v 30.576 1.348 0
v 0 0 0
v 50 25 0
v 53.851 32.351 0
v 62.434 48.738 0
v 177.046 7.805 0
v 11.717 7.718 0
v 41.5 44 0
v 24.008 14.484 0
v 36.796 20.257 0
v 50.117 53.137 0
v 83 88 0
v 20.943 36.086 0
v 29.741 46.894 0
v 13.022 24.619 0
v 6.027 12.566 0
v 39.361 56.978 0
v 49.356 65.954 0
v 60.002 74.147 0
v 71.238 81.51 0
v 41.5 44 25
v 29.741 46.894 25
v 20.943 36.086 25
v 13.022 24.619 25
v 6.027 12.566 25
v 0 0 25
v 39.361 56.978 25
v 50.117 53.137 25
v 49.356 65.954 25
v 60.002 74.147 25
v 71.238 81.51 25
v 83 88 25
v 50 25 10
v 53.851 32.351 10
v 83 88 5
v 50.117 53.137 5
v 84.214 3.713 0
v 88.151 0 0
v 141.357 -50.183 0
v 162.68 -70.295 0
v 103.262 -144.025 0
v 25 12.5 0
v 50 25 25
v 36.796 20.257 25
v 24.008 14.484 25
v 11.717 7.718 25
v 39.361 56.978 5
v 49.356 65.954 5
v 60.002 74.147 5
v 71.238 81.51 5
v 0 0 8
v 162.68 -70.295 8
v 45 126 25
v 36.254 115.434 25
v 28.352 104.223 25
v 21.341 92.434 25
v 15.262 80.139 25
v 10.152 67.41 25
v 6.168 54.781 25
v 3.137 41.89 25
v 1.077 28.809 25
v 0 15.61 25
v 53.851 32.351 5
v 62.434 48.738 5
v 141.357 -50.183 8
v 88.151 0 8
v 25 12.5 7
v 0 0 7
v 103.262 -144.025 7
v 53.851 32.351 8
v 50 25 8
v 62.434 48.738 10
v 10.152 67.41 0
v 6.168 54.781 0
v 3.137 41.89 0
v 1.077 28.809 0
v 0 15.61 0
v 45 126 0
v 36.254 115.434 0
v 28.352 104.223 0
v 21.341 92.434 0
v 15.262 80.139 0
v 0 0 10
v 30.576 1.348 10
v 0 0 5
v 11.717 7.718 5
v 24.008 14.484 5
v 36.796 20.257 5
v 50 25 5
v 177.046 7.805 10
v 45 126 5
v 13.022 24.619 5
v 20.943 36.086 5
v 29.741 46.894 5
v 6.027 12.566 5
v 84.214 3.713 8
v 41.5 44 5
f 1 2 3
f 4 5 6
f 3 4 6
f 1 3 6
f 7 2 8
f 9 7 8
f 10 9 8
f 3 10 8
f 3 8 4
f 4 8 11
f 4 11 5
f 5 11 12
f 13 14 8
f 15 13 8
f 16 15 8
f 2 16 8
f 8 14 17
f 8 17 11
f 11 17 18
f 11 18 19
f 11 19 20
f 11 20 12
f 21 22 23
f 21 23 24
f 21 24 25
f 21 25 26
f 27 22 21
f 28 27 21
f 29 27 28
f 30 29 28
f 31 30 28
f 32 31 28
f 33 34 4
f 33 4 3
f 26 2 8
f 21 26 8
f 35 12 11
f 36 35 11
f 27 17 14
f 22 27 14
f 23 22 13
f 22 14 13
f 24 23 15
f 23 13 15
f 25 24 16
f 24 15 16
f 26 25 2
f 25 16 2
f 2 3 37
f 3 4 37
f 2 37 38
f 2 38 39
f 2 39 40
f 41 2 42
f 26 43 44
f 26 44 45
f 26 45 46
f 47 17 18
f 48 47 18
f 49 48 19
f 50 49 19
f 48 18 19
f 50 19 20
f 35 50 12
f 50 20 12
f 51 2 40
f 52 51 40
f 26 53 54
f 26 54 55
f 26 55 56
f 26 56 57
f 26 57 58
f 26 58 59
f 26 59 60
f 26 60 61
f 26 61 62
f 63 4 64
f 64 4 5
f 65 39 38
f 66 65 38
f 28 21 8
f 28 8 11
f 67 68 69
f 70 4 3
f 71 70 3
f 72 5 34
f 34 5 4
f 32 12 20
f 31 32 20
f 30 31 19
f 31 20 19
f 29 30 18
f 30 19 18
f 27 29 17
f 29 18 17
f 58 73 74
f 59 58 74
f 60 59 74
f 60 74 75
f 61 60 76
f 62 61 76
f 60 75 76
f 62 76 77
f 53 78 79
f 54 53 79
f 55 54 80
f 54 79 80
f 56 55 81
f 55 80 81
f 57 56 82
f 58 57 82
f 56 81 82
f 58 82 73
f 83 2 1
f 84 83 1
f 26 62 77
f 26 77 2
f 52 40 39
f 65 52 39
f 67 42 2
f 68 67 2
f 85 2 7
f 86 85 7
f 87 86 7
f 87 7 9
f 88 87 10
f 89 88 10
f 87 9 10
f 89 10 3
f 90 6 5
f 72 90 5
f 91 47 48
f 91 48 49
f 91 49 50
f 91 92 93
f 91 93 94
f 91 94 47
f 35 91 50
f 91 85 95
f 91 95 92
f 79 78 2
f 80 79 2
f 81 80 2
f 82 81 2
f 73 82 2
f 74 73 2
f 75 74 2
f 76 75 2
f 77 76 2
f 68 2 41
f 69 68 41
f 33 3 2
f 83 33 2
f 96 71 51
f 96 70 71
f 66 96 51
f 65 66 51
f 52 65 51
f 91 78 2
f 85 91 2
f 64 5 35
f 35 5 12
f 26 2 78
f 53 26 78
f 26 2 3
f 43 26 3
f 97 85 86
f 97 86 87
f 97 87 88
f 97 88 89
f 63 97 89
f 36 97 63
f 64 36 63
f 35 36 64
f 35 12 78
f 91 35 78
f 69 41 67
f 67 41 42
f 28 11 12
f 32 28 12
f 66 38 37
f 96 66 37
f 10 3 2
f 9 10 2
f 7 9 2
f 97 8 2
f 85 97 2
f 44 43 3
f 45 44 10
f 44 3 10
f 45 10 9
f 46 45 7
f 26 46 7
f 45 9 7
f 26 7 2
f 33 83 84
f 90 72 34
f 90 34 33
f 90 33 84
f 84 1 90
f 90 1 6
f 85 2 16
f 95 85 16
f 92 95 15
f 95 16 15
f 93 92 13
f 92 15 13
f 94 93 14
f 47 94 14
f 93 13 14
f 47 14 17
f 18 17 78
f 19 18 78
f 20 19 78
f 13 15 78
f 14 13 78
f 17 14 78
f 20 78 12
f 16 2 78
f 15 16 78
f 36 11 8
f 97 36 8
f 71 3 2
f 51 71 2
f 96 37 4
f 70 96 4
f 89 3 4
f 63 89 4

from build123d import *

# Parameters (mm, degrees)
F1_DEPTH = 25
F2_DEPTH = 5
F3_DEPTH = 5
F4_DEPTH = 7
F5_DEPTH = 8
F6_DEPTH = 10


with BuildPart() as f1:
    # F0 (on Top) → F1 (new body)
    with BuildSketch(Plane.XY):
        with BuildLine():
            Line((10.152432519, 67.4098455289), (22.5, 63))
            Line((22.5, 63), (45, 126))
            ThreePointArc((45, 126), (24.7324515111, 98.3963039336), (10.152432519, 67.4098455289))
        make_face()
        with BuildLine():
            Line((0, 15.609906012), (0, 0))
            Line((0, 0), (22.5, 63))
            Line((22.5, 63), (10.152432519, 67.4098455289))
            ThreePointArc((10.152432519, 67.4098455289), (3.1367867799, 41.8899906336), (0, 15.609906012))
        make_face()
    extrude(amount=F1_DEPTH)


with BuildPart() as f1b:
    # F0 (on Top) → F1, piece 2 (new body)
    with BuildSketch(Plane.XY):
        with BuildLine():
            ThreePointArc((39.3605810321, 56.9783639171), (16.8700242777, 30.4305102872), (0, 0))
            Line((0, 0), (41.5, 44))
            Line((41.5, 44), (50.1174863388, 53.1366120219))
            Line((50.1174863388, 53.1366120219), (39.3605810321, 56.9783639171))
        make_face()
        with BuildLine():
            Line((50.1174863388, 53.1366120219), (83, 88))
            ThreePointArc((83, 88), (60.0019793598, 74.1467610135), (39.3605810321, 56.9783639171))
            Line((39.3605810321, 56.9783639171), (50.1174863388, 53.1366120219))
        make_face()
    extrude(amount=F1_DEPTH)


with BuildPart() as f1c:
    # F0 (on Top) → F1, piece 3 (new body)
    with BuildSketch(Plane.XY):
        with BuildLine():
            ThreePointArc((50, 25), (24.0080417918, 14.4839164165), (0, 0))
            Line((0, 0), (25, 12.5))
            Line((25, 12.5), (50, 25))
        make_face()
    extrude(amount=F1_DEPTH)


with BuildPart() as f2:
    # F0 (on Top) → F2 (new body)
    with BuildSketch(Plane.XY):
        with BuildLine():
            ThreePointArc((39.3605810321, 56.9783639171), (60.0019793598, 74.1467610135), (83, 88))
            Line((83, 88), (45, 126))
            Line((45, 126), (22.5, 63))
            Line((22.5, 63), (39.3605810321, 56.9783639171))
        make_face()
        with BuildLine():
            Line((22.5, 63), (0, 0))
            ThreePointArc((0, 0), (16.8700242777, 30.4305102872), (39.3605810321, 56.9783639171))
            Line((39.3605810321, 56.9783639171), (22.5, 63))
        make_face()
    extrude(amount=F2_DEPTH)


with BuildPart() as f3:
    # F0 (on Top) → F3 (new body)
    with BuildSketch(Plane.XY):
        Polygon((50.1174863388, 53.1366120219), (62.4340974212, 48.7378223496), (83, 88), align=None)
        Polygon((53.8505976096, 32.351140891), (62.4340974212, 48.7378223496), (50.1174863388, 53.1366120219), (41.5, 44), align=None)
        with BuildLine():
            Line((50, 25), (53.8505976096, 32.351140891))
            Line((53.8505976096, 32.351140891), (41.5, 44))
            Line((41.5, 44), (0, 0))
            ThreePointArc((0, 0), (24.0080417918, 14.4839164165), (50, 25))
        make_face()
    extrude(amount=F3_DEPTH)


with BuildPart() as f4:
    # F0 (on Top) → F4 (new body)
    with BuildSketch(Plane.XY):
        with BuildLine():
            ThreePointArc((87.4027997528, -121.9046783162), (89.1643733235, -120.6221975004), (90.9071316323, -119.3142632646))
            Line((90.9071316323, -119.3142632646), (39.8623721256, -17.2247442512))
            Line((39.8623721256, -17.2247442512), (0, 0))
            Line((0, 0), (87.4027997528, -121.9046783162))
        make_face()
        Polygon((39.8623721256, -17.2247442512), (31.25, 0), (0, 0), align=None)
        Polygon((0, 0), (31.25, 0), (30.5760385255, 1.347922949), align=None)
        Polygon((0, 0), (30.5760385255, 1.347922949), (25, 12.5), align=None)
        with BuildLine():
            Line((103.2623792125, -144.024758425), (90.9071316323, -119.3142632646))
            ThreePointArc((90.9071316323, -119.3142632646), (89.1643733235, -120.6221975004), (87.4027997528, -121.9046783162))
            Line((87.4027997528, -121.9046783162), (103.2623792125, -144.024758425))
        make_face()
    extrude(amount=F4_DEPTH)


with BuildPart() as f5:
    # F0 (on Top) → F5 (new body)
    with BuildSketch(Plane.XY):
        with BuildLine():
            ThreePointArc((137.6949577206, -59.4987278715), (139.6034874143, -54.871361399), (141.3565608313, -50.1828926023))
            Line((141.3565608314, -50.1828926023), (88.1506024096, 0))
            Line((88.1506024096, 0), (31.25, 0))
            Line((31.25, 0), (39.8623721256, -17.2247442512))
            Line((39.8623721256, -17.2247442512), (137.6949577206, -59.4987278715))
        make_face()
        with BuildLine():
            Line((162.680245713, -70.2950044793), (141.3565608314, -50.1828926023))
            ThreePointArc((141.3565608313, -50.1828926023), (139.6034874143, -54.871361399), (137.6949577206, -59.4987278715))
            Line((137.6949577206, -59.4987278715), (162.680245713, -70.2950044793))
        make_face()
        Polygon((39.8623721256, -17.2247442512), (31.25, 0), (0, 0), align=None)
        Polygon((0, 0), (30.5760385255, 1.347922949), (25, 12.5), align=None)
        Polygon((30.5760385255, 1.347922949), (84.2144228051, 3.7125330361), (53.8505976096, 32.351140891), (50, 25), (25, 12.5), align=None)
        Polygon((31.25, 0), (88.1506024096, 0), (84.2144228051, 3.7125330361), (30.5760385255, 1.347922949), align=None)
        Polygon((0, 0), (31.25, 0), (30.5760385255, 1.347922949), align=None)
    extrude(amount=F5_DEPTH)


with BuildPart() as f6:
    # F0 (on Top) → F6 (new body)
    with BuildSketch(Plane.XY):
        Polygon((0, 0), (30.5760385255, 1.347922949), (25, 12.5), align=None)
        Polygon((30.5760385255, 1.347922949), (84.2144228051, 3.7125330361), (53.8505976096, 32.351140891), (50, 25), (25, 12.5), align=None)
        with BuildLine():
            Line((84.2144228051, 3.7125330361), (149.8544552603, 6.6062272617))
            ThreePointArc((149.8544552603, 6.6062272617), (149.5002551148, 12.234121162), (148.9347702621, 17.8447249064))
            Line((148.9347702621, 17.8447249064), (62.4340974212, 48.7378223496))
            Line((62.4340974212, 48.7378223496), (53.8505976096, 32.351140891))
            Line((53.8505976096, 32.351140891), (84.2144228051, 3.7125330361))
        make_face()
        with BuildLine():
            ThreePointArc((148.9347702621, 17.8447249064), (149.5002551148, 12.234121162), (149.8544552603, 6.6062272617))
            Line((149.8544552603, 6.6062272617), (177.0461315832, 7.804953006))
            Line((177.0461315832, 7.804953006), (148.9347702621, 17.8447249064))
        make_face()
    extrude(amount=F6_DEPTH)


solid = Compound([f1.part, f1b.part, f1c.part, f2.part, f3.part, f4.part, f5.part, f6.part])
